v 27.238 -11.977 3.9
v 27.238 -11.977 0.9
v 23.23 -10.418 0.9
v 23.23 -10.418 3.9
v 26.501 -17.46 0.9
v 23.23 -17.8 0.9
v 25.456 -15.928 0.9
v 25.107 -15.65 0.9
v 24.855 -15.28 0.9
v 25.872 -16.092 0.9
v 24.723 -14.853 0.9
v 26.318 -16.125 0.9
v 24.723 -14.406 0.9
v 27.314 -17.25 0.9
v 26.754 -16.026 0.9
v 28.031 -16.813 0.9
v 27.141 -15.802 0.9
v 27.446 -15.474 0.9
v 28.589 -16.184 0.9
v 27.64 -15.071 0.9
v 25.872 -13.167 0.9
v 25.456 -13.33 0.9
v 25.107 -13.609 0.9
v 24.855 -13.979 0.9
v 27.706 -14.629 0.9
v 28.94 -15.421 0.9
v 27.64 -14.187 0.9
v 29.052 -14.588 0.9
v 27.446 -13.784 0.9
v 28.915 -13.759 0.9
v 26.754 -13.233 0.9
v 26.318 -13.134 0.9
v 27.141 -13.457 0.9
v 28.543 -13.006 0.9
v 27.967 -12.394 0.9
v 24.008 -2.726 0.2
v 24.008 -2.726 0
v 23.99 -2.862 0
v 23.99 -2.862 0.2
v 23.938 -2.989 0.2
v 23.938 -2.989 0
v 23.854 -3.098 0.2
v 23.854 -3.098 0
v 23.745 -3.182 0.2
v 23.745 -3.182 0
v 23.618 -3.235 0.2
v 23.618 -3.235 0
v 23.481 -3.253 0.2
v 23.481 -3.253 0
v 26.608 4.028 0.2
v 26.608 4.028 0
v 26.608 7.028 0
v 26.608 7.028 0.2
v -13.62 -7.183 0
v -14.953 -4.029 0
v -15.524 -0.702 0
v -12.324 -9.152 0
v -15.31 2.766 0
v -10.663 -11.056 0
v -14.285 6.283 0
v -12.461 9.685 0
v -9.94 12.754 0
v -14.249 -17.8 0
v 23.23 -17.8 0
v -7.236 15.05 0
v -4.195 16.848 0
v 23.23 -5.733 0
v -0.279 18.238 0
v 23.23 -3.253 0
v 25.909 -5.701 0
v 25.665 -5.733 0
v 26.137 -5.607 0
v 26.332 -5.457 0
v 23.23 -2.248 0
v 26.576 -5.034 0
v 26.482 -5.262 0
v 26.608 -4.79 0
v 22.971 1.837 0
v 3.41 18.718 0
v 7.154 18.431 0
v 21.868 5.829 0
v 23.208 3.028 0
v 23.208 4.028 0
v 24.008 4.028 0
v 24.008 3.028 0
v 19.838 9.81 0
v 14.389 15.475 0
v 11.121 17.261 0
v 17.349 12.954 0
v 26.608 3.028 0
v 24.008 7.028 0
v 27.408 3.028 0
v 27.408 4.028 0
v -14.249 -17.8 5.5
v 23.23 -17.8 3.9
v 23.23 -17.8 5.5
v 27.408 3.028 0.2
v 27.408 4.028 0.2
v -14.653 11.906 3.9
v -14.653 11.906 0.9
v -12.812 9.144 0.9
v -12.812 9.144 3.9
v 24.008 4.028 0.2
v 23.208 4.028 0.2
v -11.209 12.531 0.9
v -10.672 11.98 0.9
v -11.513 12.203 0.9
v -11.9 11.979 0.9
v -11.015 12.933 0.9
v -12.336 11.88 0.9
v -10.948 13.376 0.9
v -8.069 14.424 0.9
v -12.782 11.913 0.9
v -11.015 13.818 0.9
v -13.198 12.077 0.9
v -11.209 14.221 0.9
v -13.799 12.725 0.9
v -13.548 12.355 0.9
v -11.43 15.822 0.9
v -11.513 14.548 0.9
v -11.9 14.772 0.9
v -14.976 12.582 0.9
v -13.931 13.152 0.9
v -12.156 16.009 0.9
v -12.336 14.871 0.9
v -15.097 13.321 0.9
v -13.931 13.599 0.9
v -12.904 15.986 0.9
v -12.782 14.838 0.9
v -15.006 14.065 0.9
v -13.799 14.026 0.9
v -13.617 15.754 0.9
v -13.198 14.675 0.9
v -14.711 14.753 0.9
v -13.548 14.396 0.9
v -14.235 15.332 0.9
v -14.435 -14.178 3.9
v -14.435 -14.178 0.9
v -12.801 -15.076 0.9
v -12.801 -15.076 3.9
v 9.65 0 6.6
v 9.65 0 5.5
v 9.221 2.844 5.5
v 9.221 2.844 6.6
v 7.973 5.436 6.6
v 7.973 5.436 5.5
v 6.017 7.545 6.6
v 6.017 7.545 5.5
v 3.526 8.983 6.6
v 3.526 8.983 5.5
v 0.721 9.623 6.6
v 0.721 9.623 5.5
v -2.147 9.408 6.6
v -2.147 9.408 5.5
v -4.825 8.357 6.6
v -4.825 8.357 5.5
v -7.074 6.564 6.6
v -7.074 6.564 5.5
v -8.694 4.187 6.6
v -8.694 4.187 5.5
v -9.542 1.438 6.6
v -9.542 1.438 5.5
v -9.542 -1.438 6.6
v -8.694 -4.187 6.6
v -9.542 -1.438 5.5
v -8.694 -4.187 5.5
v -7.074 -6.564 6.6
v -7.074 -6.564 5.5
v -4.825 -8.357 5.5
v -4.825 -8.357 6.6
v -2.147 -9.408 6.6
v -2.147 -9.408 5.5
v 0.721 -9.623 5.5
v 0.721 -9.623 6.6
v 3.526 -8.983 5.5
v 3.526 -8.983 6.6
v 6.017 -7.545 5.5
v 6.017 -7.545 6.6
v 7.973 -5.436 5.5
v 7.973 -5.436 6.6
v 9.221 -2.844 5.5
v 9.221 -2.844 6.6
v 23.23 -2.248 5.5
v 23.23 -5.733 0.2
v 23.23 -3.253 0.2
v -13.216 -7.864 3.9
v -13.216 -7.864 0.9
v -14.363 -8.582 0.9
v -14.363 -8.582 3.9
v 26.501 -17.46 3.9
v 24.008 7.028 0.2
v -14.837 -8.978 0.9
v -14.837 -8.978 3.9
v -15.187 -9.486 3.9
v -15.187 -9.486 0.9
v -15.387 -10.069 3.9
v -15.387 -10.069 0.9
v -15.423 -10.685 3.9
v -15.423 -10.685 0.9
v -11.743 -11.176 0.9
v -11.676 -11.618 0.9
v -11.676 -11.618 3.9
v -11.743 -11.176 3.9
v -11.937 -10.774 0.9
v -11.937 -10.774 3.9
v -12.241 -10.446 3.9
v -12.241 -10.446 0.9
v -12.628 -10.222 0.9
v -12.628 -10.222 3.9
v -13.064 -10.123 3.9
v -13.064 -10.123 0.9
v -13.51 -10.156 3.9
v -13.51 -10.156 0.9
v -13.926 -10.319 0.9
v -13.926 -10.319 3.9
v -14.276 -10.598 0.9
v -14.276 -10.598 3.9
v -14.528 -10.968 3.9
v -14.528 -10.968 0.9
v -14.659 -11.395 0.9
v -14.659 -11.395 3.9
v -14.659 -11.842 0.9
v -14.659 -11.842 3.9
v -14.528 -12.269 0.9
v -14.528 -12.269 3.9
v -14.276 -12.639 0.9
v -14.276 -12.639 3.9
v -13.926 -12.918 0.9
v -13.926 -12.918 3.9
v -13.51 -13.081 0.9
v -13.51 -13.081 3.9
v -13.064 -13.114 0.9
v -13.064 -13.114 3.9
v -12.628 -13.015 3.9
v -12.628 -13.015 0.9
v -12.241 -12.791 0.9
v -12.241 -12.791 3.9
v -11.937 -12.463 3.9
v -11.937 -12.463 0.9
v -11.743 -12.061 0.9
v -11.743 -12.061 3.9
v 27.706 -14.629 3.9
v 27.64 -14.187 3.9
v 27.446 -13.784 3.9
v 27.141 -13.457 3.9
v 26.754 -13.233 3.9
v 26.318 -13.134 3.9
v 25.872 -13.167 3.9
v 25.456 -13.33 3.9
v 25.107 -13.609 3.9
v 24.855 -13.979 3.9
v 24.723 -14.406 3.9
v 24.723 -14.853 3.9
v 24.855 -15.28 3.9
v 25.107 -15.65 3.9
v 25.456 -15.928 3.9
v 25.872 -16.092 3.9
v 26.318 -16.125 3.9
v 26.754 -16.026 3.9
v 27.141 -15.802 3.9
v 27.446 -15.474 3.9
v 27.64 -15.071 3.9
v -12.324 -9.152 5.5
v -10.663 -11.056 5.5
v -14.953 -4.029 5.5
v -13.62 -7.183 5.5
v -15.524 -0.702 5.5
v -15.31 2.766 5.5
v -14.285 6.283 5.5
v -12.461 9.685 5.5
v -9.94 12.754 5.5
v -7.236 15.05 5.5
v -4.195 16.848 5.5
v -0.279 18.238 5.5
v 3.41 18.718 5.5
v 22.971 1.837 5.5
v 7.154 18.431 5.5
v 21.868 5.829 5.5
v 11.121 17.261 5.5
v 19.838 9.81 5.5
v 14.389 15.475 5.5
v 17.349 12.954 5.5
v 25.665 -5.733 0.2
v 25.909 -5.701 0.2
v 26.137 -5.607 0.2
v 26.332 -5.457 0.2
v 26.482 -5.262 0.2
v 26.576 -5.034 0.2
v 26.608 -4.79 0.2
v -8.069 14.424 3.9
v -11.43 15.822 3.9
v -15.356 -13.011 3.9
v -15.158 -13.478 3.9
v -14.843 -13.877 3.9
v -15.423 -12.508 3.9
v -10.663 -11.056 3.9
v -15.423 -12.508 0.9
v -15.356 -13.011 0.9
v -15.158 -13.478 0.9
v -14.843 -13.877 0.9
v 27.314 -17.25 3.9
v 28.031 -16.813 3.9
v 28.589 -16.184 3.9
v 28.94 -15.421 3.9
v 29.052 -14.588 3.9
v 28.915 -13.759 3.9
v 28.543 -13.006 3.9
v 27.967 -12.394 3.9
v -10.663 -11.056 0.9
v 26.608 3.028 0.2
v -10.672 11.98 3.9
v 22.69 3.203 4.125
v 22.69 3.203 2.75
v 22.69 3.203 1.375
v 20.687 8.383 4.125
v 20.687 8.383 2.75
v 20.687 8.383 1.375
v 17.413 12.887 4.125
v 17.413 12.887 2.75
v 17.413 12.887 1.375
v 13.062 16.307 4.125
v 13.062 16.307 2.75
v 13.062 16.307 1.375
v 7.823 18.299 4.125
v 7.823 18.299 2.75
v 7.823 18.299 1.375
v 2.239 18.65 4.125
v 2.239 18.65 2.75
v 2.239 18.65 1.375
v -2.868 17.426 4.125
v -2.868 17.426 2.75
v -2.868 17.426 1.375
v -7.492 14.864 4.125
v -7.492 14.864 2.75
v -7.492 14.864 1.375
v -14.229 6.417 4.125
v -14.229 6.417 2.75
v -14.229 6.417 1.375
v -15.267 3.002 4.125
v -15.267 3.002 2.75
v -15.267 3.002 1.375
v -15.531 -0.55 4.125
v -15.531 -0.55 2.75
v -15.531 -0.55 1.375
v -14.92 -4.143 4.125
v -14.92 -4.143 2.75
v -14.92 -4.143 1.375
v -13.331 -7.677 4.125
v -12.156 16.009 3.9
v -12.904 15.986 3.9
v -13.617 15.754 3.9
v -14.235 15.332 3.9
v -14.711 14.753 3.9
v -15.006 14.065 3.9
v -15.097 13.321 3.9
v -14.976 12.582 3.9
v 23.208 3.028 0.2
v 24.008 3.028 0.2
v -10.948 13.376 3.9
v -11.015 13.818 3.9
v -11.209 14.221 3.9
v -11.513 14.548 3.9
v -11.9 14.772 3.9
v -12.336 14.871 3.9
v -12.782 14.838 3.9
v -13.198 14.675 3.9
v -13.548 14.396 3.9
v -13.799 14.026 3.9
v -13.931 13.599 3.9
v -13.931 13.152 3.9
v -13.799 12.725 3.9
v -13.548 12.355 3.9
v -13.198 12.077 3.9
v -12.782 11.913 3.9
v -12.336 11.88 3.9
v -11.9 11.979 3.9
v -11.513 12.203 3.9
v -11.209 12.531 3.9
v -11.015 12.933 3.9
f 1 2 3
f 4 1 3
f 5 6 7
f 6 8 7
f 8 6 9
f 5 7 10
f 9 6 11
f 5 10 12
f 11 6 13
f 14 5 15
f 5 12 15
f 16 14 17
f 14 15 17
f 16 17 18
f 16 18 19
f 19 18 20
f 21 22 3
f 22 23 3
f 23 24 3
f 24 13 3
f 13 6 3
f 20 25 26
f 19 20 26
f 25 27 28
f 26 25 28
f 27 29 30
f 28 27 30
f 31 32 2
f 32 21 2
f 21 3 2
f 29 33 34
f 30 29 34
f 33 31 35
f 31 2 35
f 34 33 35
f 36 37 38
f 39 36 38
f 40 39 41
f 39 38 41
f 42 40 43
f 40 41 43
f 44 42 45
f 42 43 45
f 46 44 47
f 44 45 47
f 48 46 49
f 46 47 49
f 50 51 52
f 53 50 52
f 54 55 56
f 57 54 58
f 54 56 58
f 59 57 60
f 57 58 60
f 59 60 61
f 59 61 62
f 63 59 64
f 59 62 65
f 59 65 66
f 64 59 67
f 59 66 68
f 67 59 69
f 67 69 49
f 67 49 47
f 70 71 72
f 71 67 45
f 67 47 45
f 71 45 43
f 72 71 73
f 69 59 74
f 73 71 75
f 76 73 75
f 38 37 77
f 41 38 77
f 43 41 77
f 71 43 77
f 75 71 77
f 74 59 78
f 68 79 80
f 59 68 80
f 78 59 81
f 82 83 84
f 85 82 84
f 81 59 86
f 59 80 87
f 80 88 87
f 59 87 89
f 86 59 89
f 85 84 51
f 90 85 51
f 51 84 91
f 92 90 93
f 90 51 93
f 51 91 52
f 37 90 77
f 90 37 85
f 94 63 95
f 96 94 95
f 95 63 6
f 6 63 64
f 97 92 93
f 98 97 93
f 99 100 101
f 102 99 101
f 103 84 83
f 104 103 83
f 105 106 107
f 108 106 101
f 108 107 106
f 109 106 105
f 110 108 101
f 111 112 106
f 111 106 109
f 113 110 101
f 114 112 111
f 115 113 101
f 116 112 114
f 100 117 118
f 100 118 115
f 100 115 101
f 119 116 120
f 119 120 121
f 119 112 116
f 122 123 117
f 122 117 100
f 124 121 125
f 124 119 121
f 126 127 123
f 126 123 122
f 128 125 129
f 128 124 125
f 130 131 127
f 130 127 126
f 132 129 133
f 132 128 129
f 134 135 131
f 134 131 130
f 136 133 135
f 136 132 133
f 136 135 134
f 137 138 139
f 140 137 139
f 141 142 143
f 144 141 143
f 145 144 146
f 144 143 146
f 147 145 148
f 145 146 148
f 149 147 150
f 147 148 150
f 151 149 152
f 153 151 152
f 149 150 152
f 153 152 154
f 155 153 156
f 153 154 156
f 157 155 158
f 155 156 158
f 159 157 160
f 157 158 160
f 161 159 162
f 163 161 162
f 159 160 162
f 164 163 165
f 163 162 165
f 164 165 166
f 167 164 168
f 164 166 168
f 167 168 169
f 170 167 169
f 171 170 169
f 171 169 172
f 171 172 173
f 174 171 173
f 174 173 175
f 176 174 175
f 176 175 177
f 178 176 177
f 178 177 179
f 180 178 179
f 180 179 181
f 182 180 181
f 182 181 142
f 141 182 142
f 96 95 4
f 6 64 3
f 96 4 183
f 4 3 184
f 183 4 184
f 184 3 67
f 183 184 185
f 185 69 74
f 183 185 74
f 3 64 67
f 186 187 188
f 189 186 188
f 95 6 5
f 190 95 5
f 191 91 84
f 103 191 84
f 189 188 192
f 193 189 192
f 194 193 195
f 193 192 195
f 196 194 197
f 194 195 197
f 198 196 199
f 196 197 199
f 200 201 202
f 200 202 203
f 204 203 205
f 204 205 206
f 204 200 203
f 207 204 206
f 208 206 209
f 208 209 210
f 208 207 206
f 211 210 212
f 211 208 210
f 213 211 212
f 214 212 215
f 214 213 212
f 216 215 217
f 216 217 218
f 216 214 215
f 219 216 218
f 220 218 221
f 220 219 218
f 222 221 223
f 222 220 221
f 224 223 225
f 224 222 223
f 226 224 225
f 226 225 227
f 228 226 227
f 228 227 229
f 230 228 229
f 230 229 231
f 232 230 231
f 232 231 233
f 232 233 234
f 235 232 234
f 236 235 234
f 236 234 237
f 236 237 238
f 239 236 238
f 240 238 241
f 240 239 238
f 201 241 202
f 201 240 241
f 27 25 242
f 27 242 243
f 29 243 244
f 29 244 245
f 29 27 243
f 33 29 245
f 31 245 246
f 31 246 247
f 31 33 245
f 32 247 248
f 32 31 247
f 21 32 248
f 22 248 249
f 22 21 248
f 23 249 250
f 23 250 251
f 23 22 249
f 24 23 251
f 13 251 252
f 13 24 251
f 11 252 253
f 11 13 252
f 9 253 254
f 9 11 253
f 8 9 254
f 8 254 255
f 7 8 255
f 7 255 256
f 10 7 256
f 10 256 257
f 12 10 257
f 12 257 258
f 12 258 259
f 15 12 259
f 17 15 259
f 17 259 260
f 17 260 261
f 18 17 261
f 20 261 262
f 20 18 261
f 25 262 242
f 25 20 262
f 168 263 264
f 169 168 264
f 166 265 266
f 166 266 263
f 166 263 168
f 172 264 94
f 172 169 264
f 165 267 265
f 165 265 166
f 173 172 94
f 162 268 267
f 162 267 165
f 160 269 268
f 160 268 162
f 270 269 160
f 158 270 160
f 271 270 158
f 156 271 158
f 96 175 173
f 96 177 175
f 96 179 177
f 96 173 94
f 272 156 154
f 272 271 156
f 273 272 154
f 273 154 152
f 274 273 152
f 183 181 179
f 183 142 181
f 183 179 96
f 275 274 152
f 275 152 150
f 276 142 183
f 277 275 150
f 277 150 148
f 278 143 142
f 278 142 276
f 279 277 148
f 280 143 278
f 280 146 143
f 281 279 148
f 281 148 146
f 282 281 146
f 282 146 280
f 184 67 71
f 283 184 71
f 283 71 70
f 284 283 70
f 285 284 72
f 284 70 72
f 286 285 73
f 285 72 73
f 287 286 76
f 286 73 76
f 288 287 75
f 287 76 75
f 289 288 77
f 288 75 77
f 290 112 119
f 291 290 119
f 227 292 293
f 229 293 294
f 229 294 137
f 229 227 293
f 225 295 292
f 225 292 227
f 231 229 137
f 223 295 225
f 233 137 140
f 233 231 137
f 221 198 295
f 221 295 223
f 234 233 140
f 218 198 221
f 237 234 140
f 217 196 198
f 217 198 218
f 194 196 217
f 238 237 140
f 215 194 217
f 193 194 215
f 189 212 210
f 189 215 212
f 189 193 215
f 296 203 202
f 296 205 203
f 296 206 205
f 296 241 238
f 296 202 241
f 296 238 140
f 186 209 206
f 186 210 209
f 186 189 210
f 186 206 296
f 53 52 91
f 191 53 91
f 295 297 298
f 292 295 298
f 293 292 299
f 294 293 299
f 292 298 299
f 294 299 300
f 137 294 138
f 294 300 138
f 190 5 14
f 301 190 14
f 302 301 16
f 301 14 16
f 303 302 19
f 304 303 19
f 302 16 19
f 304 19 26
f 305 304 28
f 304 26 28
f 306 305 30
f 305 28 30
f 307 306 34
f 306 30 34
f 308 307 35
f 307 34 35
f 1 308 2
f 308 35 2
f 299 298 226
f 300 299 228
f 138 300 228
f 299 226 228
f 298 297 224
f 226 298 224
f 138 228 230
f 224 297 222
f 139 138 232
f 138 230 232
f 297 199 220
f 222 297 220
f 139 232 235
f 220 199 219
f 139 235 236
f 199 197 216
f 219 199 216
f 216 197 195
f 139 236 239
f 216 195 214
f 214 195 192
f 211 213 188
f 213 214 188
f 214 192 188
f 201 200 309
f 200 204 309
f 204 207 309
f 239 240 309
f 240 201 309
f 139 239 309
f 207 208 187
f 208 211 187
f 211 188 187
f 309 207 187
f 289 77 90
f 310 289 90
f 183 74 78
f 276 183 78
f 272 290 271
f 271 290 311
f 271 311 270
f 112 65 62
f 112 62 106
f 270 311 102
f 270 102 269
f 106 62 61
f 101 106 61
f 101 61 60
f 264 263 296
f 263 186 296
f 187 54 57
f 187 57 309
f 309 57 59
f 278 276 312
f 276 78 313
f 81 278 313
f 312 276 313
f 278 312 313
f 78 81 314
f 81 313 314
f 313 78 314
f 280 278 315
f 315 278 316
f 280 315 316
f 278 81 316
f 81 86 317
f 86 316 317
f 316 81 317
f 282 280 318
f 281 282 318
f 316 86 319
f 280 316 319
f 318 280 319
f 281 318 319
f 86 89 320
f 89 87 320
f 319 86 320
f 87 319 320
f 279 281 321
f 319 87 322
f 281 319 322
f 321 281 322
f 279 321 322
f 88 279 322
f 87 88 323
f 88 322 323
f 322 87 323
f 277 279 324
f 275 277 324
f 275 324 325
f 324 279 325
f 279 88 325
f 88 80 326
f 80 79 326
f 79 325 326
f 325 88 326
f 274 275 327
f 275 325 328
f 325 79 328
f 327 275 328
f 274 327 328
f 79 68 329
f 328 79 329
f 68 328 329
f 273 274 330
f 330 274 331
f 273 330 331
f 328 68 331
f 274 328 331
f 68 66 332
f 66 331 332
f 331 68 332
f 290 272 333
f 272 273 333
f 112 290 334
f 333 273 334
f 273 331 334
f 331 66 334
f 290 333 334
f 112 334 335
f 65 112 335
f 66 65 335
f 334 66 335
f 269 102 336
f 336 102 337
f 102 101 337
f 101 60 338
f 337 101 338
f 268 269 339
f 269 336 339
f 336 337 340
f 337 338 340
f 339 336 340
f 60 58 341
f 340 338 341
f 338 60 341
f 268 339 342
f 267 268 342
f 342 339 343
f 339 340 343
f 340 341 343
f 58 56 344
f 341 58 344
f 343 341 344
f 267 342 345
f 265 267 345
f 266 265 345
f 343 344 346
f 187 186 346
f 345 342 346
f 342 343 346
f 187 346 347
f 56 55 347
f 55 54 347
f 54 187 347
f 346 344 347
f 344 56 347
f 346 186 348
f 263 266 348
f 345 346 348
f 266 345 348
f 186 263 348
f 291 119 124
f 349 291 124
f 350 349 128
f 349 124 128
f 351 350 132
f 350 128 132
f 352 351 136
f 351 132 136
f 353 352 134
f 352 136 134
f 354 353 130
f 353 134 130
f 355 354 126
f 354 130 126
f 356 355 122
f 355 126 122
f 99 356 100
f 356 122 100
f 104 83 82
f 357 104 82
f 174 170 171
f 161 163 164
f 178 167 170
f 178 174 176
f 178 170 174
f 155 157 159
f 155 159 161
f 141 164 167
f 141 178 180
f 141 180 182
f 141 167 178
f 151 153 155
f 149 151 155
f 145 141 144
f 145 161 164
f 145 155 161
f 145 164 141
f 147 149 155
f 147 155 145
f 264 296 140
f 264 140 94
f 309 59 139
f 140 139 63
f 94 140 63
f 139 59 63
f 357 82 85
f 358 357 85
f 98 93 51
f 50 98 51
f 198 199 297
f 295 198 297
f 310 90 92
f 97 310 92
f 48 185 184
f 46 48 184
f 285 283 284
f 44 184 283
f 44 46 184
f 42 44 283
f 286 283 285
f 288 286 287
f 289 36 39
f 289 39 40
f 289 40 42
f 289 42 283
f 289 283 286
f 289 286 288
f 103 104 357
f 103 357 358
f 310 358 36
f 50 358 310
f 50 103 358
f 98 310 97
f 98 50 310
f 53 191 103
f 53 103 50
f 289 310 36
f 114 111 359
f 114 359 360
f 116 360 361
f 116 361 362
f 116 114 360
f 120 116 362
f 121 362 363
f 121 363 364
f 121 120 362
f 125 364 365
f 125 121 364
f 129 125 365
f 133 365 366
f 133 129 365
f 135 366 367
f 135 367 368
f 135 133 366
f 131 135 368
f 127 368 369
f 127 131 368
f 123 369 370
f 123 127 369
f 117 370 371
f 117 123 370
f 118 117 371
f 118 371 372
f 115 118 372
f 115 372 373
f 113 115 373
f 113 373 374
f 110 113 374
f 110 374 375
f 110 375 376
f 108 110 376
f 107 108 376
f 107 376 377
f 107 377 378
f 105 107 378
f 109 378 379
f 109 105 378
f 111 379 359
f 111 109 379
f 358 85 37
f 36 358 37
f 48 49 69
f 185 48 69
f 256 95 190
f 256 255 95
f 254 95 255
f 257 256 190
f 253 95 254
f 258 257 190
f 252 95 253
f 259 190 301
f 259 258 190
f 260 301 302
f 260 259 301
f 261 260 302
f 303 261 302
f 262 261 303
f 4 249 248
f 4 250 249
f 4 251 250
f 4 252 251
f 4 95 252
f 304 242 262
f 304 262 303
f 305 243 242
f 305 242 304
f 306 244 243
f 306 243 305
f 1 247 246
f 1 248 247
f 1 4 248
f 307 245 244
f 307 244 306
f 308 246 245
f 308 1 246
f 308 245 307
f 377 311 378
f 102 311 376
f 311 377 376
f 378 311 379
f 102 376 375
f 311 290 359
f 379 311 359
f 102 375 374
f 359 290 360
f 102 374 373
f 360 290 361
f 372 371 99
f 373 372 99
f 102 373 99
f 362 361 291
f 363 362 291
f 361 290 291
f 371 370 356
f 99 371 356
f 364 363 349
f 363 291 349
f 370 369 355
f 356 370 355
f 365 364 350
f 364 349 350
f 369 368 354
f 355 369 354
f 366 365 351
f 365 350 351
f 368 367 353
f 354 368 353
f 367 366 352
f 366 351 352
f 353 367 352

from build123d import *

# Parameters (mm, degrees)
SKIZZE1_R                       = 9.65
AUFSATZ_LINEAR_AUSTRAGEN1_DEPTH = 5.5
SKIZZE1_3_R                     = 9.65
AUFSATZ_LINEAR_AUSTRAGEN2_DEPTH = 6.6
AUFSATZ_LINEAR_START            = 0.9
SKIZZE1_5_R                     = 1.5
AUFSATZ_LINEAR_AUSTRAGEN3_DEPTH = 3
AUFSATZ_LINEAR_AUSTRAGEN4_DEPTH = 0.2


with BuildPart() as part:
    # Skizze1 → Aufsatz-Linear austragen1 (new body)
    with BuildSketch(Plane.XY):
        with BuildLine():
            Line((-14.24879669, -17.8), (23.22989124, -17.8))
            Line((23.22989124, -17.8), (23.22989124, -2.247542747))
            add(Edge.make_bspline(
                [(23.22989124, -2.247542747), (23.570505731, 5.01843493), (17.435920317, 16.509432663), (2.315543688, 19.773891452), (-13.917413027, 13.221960429), (-19.306383662, -2.33852969), (-10.663184769, -11.056444767)],
                knots=[0, 0, 0, 0, 0.303535836, 0.457029394, 0.601755461, 1, 1, 1, 1], degree=3))
            Line((-10.663184769, -11.056444767), (-14.24879669, -17.8))
        make_face()
        Circle(SKIZZE1_R, mode=Mode.SUBTRACT)
    extrude(amount=AUFSATZ_LINEAR_AUSTRAGEN1_DEPTH)

    # Skizze1<3> → Aufsatz-Linear austragen2 (add)
    with BuildSketch(Plane.XY):
        Circle(SKIZZE1_3_R)
    extrude(amount=AUFSATZ_LINEAR_AUSTRAGEN2_DEPTH)

    # Skizze1<5> → Aufsatz-Linear austragen3 (add)
    # profile 1 of 3: a face of its own
    with BuildSketch(Plane.XY.offset(AUFSATZ_LINEAR_START)):
        with BuildLine():
            Line((23.22989124, -10.418487336), (23.22989124, -17.8))
            Line((23.22989124, -17.8), (26.500672864, -17.459737855))
            ThreePointArc((26.500672864, -17.459737855), (29.026515796, -15.008489952), (27.237700891, -11.977212988))
            Line((27.237700891, -11.977212988), (23.22989124, -10.418487336))
        make_face()
        with Locations((26.206225463, -14.629352042)):
            Circle(SKIZZE1_5_R, mode=Mode.SUBTRACT)
    # profile 2 of 3: a face of its own
    with BuildSketch(Plane.XY.offset(AUFSATZ_LINEAR_START)):
        with BuildLine():
            Line((-14.434796379, -14.178445133), (-12.800547832, -15.076240045))
            Line((-12.800547832, -15.076240045), (-10.663184769, -11.056444767))
            add(Edge.make_bspline(
                [(-13.215759107, -7.863797122), (-12.531518629, -8.956537973), (-11.685451286, -10.025341262), (-10.663184769, -11.056444767)],
                knots=[0.952897988, 0.952897988, 0.952897988, 0.952897988, 1, 1, 1, 1], degree=3))
            Line((-13.215759107, -7.863797122), (-14.363260793, -8.582327138))
            ThreePointArc((-14.363260793, -8.582327138), (-15.186624929, -9.485521456), (-15.423283617, -10.684554877))
            Line((-15.423283617, -10.684554877), (-15.423283617, -12.507578786))
            ThreePointArc((-15.423283617, -12.507578786), (-15.157656262, -13.478261712), (-14.434796379, -14.178445133))
        make_face()
        with Locations((-13.17621437, -11.618483702)):
            Circle(SKIZZE1_5_R, mode=Mode.SUBTRACT)
    # profile 3 of 3: a face of its own
    with BuildSketch(Plane.XY.offset(AUFSATZ_LINEAR_START)):
        with BuildLine():
            add(Edge.make_bspline(
                [(-8.069037879, 14.42388259), (-9.937212437, 12.945618154), (-11.560246269, 11.14536638), (-12.81225318, 9.143669748)],
                knots=[0.61161883, 0.61161883, 0.61161883, 0.61161883, 0.708712293, 0.708712293, 0.708712293, 0.708712293], degree=3))
            Line((-8.069037879, 14.42388259), (-11.430379202, 15.82207236))
            ThreePointArc((-11.430379202, 15.82207236), (-14.493909546, 15.059392032), (-14.653056668, 11.90636624))
            Line((-14.653056668, 11.90636624), (-12.81225318, 9.143669748))
        make_face()
        with Locations((-12.448019378, 13.375597605)):
            Circle(SKIZZE1_5_R, mode=Mode.SUBTRACT)
    extrude(amount=AUFSATZ_LINEAR_AUSTRAGEN3_DEPTH)

    # Skizze1<6> → Aufsatz-Linear austragen4 (add)
    with BuildSketch(Plane.XY):
        with BuildLine():
            Line((23.22989124, -3.252529258), (23.22989124, -5.733420738))
            Line((23.22989124, -5.733420738), (25.665000561, -5.733420738))
            ThreePointArc((25.665000561, -5.733420738), (26.331877002, -5.457191471), (26.608106269, -4.79031503))
            Line((26.608106269, -4.79031503), (26.608106269, 3.027890879))
            Line((26.608106269, 3.027890879), (27.408106269, 3.027890879))
            Line((27.408106269, 3.027890879), (27.408106269, 4.027890879))
            Line((27.408106269, 4.027890879), (26.608106269, 4.027890879))
            Line((26.608106269, 4.027890879), (26.608106269, 7.027890879))
            Line((26.608106269, 7.027890879), (24.008106269, 7.027890879))
            Line((24.008106269, 7.027890879), (24.008106269, 4.027890879))
            Line((24.008106269, 4.027890879), (23.208106269, 4.027890879))
            Line((23.208106269, 4.027890879), (23.208106269, 3.027890879))
            Line((23.208106269, 3.027890879), (24.008106269, 3.027890879))
            Line((24.008106269, 3.027890879), (24.008106269, -2.725622817))
            ThreePointArc((24.008106269, -2.725622817), (23.853778945, -3.098201935), (23.481199827, -3.252529258))
            Line((23.481199827, -3.252529258), (23.22989124, -3.252529258))
        make_face()
    extrude(amount=AUFSATZ_LINEAR_AUSTRAGEN4_DEPTH)


solid = part.part
